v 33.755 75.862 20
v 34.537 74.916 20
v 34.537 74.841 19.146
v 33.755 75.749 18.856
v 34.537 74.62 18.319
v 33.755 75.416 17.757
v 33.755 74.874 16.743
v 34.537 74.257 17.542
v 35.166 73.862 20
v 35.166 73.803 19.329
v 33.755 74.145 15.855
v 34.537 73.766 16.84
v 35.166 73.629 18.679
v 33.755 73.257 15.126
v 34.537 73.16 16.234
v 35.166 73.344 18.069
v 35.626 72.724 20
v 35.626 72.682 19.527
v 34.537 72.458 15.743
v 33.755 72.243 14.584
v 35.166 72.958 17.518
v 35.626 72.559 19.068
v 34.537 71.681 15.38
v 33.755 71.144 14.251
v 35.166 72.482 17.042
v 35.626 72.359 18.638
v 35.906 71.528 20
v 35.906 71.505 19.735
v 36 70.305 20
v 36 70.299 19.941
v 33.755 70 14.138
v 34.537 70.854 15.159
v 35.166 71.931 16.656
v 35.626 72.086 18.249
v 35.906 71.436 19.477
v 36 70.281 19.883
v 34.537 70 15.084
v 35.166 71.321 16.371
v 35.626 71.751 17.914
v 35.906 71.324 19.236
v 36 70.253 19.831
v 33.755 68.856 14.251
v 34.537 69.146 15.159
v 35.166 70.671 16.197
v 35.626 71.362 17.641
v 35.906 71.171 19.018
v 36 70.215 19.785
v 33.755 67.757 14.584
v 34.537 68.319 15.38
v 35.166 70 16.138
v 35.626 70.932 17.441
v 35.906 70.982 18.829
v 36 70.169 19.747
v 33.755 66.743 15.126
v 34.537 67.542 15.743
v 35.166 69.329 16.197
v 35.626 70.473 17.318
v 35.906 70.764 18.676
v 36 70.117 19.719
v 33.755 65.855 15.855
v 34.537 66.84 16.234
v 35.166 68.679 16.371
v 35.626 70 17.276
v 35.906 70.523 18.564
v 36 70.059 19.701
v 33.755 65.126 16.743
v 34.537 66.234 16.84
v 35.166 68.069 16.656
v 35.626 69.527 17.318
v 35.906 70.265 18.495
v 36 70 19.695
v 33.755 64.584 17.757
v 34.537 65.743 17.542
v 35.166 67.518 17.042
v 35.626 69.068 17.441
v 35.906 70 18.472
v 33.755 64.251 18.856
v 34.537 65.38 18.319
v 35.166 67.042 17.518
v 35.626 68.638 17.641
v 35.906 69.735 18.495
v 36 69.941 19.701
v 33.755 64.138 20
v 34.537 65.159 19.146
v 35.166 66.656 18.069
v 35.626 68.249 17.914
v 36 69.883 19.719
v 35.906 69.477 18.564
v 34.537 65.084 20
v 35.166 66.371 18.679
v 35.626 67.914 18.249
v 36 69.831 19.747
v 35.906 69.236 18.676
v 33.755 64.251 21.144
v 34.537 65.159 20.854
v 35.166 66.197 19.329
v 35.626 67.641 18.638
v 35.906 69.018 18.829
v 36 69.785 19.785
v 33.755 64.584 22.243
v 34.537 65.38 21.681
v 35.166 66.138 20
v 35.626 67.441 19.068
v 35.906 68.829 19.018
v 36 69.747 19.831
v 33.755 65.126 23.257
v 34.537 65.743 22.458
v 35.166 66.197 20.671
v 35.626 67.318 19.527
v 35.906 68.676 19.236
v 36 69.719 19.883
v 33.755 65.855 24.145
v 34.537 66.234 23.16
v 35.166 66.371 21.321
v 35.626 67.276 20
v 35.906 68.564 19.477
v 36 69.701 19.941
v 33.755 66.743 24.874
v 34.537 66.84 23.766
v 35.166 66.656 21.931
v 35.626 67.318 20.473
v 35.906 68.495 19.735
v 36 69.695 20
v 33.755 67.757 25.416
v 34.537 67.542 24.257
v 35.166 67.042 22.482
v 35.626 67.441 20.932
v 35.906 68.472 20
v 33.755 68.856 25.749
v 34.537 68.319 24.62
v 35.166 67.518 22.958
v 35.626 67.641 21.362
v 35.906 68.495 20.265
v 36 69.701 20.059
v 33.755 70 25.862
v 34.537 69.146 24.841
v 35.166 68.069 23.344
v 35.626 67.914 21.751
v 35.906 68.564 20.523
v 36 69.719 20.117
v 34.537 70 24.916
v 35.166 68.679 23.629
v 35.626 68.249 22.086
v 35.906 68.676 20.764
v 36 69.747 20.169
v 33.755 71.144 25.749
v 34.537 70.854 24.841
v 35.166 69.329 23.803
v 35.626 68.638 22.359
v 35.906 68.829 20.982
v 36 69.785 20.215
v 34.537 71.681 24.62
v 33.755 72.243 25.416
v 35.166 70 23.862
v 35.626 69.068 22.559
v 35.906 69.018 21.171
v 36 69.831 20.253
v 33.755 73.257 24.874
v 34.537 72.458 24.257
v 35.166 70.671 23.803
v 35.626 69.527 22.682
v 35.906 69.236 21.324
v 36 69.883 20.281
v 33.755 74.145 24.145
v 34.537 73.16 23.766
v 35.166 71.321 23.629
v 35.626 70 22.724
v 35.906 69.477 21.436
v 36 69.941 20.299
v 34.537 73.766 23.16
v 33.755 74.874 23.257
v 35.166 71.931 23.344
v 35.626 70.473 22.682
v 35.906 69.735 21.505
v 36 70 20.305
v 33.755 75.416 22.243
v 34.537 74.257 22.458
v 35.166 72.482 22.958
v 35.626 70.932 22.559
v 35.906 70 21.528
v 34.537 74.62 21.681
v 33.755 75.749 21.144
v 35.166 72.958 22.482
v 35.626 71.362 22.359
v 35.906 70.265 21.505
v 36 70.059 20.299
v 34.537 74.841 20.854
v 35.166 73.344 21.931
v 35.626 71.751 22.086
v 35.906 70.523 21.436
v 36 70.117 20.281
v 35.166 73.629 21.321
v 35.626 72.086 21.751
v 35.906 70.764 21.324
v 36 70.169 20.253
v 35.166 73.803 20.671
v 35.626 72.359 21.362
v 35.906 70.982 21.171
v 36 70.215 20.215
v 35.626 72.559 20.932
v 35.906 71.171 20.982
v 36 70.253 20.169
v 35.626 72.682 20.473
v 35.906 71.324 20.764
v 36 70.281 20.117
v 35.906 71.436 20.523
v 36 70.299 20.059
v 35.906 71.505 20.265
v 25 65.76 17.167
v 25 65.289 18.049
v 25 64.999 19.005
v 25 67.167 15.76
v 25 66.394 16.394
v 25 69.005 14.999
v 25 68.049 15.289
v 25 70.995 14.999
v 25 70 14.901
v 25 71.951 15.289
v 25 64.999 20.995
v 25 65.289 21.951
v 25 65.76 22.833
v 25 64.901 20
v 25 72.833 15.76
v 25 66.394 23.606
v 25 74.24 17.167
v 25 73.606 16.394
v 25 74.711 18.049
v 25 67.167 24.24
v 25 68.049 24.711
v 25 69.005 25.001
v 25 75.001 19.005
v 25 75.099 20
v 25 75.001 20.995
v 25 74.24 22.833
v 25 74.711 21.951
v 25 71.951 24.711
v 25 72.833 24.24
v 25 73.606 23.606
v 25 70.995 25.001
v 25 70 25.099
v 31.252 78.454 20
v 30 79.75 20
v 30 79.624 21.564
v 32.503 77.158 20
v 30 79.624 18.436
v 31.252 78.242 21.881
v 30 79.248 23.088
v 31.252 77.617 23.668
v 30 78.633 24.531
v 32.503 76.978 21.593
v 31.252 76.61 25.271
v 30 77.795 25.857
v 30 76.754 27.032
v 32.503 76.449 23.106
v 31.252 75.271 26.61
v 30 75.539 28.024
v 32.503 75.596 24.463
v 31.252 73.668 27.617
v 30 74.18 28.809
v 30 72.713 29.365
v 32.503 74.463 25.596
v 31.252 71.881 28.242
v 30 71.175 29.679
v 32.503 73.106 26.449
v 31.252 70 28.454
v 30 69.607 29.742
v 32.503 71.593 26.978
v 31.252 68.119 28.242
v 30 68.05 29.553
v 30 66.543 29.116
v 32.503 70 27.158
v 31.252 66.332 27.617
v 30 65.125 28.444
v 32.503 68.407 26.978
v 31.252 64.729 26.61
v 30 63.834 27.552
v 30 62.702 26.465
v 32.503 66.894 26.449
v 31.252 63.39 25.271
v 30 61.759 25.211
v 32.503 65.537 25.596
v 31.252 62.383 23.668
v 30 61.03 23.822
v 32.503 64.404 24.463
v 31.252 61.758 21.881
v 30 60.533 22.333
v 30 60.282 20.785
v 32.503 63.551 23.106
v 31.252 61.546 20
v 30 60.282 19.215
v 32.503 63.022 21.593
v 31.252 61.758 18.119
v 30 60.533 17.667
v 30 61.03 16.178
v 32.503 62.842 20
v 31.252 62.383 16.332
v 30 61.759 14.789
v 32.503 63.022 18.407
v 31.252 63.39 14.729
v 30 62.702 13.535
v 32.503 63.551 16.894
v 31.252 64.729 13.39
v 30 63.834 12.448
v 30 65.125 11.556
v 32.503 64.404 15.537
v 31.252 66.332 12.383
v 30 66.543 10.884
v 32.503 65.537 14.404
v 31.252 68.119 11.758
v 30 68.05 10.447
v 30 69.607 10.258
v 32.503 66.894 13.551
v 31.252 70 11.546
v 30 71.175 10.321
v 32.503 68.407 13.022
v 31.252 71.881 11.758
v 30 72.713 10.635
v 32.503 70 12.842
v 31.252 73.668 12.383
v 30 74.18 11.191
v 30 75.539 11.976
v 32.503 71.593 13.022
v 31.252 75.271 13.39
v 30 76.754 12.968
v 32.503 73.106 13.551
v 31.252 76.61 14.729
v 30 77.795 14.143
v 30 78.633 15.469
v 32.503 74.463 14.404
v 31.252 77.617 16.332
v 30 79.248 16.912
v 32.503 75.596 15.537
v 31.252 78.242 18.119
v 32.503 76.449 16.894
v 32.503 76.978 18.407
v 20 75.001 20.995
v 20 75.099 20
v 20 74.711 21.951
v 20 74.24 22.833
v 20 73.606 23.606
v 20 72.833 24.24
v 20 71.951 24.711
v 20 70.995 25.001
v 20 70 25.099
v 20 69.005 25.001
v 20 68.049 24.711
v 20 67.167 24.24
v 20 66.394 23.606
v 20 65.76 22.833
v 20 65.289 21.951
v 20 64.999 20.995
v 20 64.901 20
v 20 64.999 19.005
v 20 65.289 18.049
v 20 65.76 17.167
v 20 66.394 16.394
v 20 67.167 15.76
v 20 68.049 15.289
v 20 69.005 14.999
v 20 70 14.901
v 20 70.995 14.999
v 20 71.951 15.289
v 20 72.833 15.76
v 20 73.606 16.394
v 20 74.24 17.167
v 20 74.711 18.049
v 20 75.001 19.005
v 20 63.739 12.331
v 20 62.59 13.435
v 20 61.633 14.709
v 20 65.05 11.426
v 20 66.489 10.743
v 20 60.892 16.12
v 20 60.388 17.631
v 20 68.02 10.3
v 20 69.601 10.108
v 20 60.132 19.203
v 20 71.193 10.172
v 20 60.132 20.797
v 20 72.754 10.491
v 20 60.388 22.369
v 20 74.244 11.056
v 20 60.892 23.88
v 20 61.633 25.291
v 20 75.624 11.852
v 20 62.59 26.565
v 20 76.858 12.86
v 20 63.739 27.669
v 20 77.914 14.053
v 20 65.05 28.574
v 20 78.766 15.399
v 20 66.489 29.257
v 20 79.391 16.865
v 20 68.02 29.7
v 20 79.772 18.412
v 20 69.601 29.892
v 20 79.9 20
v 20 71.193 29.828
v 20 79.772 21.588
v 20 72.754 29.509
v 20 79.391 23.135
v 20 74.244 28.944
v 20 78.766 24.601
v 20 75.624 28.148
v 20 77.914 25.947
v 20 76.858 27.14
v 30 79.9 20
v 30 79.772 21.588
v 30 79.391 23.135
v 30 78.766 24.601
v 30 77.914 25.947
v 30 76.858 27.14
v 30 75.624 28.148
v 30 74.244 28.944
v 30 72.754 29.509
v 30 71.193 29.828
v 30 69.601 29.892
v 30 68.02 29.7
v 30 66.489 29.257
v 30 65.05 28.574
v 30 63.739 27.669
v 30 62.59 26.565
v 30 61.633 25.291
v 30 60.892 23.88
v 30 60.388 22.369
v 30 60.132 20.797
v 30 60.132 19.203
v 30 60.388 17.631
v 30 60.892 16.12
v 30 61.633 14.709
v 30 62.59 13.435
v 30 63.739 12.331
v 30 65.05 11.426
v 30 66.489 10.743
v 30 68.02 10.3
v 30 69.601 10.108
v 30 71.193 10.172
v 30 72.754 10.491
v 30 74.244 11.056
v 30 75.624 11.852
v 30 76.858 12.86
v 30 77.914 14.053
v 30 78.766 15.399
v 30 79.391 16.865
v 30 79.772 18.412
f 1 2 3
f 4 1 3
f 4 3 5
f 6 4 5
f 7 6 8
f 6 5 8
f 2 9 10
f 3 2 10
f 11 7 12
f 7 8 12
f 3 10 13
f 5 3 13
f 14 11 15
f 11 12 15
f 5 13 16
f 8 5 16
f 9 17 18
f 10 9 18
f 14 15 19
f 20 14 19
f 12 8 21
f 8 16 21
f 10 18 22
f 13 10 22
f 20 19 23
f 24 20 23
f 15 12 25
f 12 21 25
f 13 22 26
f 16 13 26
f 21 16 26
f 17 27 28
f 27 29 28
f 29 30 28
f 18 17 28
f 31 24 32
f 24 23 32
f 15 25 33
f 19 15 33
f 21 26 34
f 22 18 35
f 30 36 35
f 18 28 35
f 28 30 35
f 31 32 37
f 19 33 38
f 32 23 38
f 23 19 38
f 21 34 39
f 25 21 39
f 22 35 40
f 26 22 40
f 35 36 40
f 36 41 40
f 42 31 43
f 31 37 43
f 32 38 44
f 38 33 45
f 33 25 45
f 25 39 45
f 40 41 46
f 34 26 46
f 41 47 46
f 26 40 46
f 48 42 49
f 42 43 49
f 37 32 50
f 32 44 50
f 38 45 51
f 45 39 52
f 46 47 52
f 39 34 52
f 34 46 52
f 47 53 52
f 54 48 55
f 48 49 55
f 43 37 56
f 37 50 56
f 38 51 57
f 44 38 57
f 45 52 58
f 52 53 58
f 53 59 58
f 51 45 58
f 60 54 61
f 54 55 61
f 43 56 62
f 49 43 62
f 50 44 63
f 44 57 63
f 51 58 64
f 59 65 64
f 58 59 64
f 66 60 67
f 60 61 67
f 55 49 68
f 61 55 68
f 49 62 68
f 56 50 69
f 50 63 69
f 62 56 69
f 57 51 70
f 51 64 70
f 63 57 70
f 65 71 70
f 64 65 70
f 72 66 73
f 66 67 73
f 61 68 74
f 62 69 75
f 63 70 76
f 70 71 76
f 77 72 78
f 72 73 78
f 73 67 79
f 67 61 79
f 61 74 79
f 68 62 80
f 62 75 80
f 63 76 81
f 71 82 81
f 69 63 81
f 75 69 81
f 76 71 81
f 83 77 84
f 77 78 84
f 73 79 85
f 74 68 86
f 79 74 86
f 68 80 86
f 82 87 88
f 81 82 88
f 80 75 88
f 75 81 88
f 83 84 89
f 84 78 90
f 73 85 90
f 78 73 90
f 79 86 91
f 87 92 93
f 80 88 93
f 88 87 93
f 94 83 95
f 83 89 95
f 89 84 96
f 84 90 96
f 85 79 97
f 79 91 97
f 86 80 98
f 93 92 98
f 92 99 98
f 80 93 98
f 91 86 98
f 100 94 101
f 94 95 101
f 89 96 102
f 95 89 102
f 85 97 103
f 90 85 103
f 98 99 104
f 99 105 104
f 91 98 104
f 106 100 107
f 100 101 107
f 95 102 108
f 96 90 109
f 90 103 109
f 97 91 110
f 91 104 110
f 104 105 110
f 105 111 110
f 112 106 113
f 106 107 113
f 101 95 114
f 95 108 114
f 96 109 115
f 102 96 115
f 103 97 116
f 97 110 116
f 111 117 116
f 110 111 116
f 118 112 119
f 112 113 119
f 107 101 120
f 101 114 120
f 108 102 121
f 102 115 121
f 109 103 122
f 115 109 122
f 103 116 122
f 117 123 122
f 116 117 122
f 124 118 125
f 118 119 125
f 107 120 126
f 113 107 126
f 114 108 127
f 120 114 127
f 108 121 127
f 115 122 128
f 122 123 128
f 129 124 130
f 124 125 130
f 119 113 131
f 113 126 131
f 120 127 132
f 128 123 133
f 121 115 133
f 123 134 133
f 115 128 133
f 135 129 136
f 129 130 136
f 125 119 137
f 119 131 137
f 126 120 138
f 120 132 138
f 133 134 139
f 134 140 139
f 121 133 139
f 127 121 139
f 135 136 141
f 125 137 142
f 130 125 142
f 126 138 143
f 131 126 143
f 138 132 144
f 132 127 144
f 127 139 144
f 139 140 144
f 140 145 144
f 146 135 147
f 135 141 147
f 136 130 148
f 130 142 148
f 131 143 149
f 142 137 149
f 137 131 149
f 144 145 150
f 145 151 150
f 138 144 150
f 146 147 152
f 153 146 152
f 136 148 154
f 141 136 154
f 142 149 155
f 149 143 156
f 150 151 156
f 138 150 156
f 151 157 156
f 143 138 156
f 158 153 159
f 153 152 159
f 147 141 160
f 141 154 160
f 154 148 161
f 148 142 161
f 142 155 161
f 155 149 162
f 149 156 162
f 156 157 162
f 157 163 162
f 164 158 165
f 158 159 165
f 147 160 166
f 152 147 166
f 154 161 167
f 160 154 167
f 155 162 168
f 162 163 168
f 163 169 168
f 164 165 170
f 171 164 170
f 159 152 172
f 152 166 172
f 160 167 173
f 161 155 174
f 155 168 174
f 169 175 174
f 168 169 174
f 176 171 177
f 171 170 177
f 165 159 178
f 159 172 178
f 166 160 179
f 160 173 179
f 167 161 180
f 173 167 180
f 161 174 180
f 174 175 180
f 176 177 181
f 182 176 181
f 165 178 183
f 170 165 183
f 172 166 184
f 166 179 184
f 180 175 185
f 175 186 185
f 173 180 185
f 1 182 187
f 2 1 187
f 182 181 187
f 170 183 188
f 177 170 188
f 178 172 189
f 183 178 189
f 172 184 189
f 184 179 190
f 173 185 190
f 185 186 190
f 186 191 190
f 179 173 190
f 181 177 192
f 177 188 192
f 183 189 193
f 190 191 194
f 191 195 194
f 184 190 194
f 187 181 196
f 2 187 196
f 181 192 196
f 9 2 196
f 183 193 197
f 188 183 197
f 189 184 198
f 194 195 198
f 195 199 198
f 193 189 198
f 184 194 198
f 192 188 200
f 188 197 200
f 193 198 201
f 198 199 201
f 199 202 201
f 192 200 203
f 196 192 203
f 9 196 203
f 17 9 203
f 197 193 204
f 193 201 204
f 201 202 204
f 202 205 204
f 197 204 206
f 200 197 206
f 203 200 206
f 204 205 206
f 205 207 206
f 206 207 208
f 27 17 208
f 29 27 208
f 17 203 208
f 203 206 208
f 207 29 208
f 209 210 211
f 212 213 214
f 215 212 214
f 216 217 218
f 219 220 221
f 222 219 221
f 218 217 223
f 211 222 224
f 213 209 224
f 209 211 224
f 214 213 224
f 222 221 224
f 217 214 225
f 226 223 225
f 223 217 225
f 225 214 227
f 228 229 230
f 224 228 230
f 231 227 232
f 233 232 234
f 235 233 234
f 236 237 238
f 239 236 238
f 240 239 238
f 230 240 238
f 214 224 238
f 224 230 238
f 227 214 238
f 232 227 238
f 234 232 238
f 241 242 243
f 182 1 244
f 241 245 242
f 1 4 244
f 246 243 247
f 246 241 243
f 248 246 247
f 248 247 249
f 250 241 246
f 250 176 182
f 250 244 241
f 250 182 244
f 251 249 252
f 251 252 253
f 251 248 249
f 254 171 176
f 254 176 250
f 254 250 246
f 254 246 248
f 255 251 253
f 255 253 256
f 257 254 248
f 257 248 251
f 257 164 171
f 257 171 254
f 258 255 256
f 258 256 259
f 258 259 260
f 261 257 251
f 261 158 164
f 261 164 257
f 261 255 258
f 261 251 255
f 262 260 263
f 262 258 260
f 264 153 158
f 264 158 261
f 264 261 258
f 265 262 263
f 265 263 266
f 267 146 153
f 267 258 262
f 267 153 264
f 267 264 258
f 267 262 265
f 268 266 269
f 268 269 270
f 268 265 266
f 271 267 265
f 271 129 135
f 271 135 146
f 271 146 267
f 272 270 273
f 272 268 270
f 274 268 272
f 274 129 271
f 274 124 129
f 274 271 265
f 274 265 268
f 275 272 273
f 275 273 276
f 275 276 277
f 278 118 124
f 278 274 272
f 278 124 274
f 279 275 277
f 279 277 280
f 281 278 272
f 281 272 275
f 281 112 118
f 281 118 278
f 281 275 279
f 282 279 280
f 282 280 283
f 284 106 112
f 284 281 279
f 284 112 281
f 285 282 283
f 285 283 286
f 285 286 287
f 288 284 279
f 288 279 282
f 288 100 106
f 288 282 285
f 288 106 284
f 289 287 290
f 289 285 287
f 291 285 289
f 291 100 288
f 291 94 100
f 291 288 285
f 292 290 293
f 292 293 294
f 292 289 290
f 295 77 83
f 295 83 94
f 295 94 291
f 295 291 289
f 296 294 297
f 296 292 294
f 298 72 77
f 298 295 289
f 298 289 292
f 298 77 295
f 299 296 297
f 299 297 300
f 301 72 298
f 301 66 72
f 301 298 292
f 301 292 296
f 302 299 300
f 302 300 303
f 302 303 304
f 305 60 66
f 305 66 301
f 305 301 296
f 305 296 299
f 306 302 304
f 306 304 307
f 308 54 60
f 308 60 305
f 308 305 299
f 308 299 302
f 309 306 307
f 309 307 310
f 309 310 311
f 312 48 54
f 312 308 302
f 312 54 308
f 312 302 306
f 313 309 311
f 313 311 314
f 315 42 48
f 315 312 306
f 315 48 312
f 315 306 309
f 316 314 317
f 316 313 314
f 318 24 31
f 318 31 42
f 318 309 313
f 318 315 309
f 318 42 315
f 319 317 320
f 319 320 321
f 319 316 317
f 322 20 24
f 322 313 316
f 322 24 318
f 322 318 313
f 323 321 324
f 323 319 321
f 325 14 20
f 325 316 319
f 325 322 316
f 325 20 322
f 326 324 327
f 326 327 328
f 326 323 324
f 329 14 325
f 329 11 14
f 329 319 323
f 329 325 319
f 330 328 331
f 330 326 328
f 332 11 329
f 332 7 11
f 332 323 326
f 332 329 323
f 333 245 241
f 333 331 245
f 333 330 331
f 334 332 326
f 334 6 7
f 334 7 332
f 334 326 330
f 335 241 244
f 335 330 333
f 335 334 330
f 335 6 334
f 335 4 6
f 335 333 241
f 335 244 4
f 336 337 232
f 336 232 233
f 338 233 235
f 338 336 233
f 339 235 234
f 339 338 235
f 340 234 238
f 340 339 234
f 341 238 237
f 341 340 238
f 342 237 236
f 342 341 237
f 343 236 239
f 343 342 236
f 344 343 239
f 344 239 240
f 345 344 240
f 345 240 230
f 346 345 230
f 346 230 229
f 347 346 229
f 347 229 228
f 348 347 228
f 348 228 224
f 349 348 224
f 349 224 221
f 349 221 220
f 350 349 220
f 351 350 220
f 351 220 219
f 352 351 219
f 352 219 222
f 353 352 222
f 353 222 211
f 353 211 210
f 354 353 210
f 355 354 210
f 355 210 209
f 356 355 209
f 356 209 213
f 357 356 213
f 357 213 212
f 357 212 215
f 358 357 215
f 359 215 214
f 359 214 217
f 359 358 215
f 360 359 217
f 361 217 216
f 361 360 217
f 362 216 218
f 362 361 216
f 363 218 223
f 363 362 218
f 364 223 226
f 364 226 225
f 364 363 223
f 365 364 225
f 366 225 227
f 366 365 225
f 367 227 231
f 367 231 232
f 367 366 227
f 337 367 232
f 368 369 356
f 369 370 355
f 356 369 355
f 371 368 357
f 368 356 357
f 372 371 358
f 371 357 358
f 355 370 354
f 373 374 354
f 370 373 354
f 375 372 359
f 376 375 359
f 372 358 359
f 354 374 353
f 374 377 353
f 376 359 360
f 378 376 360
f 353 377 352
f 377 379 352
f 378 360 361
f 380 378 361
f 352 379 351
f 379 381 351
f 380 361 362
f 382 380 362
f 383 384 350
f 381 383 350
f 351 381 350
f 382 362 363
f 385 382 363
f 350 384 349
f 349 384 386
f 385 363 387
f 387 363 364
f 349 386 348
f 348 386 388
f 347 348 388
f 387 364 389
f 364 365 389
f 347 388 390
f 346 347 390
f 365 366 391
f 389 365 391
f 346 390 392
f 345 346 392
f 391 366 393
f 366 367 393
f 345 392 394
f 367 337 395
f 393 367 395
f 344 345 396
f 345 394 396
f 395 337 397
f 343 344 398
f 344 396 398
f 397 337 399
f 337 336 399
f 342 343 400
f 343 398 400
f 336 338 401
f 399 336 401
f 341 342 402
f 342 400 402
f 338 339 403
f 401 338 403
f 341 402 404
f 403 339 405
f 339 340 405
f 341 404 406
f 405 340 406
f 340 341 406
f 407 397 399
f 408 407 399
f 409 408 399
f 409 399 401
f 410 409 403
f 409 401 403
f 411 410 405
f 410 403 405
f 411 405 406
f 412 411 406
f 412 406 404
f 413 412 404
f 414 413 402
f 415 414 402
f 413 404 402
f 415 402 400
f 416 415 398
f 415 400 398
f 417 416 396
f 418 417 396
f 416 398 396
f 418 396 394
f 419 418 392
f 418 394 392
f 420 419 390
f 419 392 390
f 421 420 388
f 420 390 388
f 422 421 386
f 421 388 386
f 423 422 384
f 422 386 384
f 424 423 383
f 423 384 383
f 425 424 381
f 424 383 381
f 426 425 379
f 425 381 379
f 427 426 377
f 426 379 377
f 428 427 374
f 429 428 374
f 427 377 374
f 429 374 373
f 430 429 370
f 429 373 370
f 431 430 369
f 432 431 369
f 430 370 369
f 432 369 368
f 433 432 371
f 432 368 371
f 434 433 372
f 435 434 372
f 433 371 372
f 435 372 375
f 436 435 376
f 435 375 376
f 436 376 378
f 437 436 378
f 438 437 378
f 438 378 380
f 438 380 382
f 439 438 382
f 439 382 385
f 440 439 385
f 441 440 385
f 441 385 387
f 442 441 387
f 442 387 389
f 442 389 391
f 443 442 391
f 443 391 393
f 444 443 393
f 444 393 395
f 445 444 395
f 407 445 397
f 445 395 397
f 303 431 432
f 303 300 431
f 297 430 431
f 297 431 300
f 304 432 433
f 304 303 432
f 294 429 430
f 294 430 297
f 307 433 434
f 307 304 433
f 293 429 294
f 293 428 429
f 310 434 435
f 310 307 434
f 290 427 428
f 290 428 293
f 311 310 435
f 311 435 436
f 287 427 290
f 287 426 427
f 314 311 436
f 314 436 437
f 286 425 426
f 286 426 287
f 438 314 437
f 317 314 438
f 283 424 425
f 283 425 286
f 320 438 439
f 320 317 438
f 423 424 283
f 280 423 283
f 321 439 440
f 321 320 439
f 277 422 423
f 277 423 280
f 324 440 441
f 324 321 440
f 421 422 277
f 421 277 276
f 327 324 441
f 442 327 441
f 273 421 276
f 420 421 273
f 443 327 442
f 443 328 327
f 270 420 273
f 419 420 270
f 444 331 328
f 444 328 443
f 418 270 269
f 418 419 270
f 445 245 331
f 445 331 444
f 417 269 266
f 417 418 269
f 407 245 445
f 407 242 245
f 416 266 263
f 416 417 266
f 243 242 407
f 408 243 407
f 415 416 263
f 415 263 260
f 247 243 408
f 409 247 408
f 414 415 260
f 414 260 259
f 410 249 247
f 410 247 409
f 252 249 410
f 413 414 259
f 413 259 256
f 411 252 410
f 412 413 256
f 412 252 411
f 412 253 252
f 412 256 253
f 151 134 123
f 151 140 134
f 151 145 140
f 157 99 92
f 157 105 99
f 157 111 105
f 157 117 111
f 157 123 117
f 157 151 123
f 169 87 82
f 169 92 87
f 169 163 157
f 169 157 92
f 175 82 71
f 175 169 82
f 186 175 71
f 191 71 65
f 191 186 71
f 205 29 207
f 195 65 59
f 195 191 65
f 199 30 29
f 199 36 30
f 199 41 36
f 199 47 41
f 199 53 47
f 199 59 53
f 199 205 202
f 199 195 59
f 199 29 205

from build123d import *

# Parameters (mm, degrees)
SKETCH020_R     = 9.9
PAD011_DEPTH    = 10
SKETCH021_R     = 9.75
PAD012_DEPTH    = 6
PAD012_TAPER    = 46
SKETCH022_R     = 5.09902
POCKET005_DEPTH = 25
FILLET_R        = 8


with BuildPart() as part:
    # Sketch020 → Pad011 (new body)
    with BuildSketch(Plane.YZ.offset(20)):
        Circle(SKETCH020_R)
    extrude(amount=PAD011_DEPTH)

    # Sketch021 → Pad012 (join)
    with BuildSketch(Plane.YZ.offset(30)):
        Circle(SKETCH021_R)
    extrude(amount=PAD012_DEPTH, taper=PAD012_TAPER)

    # Sketch022 → Pocket005 (cut)
    with BuildSketch(Plane.YZ):
        Circle(SKETCH022_R)
    extrude(amount=POCKET005_DEPTH, mode=Mode.SUBTRACT)

    # Fillet
    fillet_edges = [part.edges().sort_by_distance(p)[0] for p in [
        (36, -3.536818, 0),
    ]]
    fillet(fillet_edges, radius=FILLET_R)


with BuildPart() as part_1:
    # Body005 placement: moved
    add(part.part.moved(Location((0, 70, 20))))


solid = part_1.part
